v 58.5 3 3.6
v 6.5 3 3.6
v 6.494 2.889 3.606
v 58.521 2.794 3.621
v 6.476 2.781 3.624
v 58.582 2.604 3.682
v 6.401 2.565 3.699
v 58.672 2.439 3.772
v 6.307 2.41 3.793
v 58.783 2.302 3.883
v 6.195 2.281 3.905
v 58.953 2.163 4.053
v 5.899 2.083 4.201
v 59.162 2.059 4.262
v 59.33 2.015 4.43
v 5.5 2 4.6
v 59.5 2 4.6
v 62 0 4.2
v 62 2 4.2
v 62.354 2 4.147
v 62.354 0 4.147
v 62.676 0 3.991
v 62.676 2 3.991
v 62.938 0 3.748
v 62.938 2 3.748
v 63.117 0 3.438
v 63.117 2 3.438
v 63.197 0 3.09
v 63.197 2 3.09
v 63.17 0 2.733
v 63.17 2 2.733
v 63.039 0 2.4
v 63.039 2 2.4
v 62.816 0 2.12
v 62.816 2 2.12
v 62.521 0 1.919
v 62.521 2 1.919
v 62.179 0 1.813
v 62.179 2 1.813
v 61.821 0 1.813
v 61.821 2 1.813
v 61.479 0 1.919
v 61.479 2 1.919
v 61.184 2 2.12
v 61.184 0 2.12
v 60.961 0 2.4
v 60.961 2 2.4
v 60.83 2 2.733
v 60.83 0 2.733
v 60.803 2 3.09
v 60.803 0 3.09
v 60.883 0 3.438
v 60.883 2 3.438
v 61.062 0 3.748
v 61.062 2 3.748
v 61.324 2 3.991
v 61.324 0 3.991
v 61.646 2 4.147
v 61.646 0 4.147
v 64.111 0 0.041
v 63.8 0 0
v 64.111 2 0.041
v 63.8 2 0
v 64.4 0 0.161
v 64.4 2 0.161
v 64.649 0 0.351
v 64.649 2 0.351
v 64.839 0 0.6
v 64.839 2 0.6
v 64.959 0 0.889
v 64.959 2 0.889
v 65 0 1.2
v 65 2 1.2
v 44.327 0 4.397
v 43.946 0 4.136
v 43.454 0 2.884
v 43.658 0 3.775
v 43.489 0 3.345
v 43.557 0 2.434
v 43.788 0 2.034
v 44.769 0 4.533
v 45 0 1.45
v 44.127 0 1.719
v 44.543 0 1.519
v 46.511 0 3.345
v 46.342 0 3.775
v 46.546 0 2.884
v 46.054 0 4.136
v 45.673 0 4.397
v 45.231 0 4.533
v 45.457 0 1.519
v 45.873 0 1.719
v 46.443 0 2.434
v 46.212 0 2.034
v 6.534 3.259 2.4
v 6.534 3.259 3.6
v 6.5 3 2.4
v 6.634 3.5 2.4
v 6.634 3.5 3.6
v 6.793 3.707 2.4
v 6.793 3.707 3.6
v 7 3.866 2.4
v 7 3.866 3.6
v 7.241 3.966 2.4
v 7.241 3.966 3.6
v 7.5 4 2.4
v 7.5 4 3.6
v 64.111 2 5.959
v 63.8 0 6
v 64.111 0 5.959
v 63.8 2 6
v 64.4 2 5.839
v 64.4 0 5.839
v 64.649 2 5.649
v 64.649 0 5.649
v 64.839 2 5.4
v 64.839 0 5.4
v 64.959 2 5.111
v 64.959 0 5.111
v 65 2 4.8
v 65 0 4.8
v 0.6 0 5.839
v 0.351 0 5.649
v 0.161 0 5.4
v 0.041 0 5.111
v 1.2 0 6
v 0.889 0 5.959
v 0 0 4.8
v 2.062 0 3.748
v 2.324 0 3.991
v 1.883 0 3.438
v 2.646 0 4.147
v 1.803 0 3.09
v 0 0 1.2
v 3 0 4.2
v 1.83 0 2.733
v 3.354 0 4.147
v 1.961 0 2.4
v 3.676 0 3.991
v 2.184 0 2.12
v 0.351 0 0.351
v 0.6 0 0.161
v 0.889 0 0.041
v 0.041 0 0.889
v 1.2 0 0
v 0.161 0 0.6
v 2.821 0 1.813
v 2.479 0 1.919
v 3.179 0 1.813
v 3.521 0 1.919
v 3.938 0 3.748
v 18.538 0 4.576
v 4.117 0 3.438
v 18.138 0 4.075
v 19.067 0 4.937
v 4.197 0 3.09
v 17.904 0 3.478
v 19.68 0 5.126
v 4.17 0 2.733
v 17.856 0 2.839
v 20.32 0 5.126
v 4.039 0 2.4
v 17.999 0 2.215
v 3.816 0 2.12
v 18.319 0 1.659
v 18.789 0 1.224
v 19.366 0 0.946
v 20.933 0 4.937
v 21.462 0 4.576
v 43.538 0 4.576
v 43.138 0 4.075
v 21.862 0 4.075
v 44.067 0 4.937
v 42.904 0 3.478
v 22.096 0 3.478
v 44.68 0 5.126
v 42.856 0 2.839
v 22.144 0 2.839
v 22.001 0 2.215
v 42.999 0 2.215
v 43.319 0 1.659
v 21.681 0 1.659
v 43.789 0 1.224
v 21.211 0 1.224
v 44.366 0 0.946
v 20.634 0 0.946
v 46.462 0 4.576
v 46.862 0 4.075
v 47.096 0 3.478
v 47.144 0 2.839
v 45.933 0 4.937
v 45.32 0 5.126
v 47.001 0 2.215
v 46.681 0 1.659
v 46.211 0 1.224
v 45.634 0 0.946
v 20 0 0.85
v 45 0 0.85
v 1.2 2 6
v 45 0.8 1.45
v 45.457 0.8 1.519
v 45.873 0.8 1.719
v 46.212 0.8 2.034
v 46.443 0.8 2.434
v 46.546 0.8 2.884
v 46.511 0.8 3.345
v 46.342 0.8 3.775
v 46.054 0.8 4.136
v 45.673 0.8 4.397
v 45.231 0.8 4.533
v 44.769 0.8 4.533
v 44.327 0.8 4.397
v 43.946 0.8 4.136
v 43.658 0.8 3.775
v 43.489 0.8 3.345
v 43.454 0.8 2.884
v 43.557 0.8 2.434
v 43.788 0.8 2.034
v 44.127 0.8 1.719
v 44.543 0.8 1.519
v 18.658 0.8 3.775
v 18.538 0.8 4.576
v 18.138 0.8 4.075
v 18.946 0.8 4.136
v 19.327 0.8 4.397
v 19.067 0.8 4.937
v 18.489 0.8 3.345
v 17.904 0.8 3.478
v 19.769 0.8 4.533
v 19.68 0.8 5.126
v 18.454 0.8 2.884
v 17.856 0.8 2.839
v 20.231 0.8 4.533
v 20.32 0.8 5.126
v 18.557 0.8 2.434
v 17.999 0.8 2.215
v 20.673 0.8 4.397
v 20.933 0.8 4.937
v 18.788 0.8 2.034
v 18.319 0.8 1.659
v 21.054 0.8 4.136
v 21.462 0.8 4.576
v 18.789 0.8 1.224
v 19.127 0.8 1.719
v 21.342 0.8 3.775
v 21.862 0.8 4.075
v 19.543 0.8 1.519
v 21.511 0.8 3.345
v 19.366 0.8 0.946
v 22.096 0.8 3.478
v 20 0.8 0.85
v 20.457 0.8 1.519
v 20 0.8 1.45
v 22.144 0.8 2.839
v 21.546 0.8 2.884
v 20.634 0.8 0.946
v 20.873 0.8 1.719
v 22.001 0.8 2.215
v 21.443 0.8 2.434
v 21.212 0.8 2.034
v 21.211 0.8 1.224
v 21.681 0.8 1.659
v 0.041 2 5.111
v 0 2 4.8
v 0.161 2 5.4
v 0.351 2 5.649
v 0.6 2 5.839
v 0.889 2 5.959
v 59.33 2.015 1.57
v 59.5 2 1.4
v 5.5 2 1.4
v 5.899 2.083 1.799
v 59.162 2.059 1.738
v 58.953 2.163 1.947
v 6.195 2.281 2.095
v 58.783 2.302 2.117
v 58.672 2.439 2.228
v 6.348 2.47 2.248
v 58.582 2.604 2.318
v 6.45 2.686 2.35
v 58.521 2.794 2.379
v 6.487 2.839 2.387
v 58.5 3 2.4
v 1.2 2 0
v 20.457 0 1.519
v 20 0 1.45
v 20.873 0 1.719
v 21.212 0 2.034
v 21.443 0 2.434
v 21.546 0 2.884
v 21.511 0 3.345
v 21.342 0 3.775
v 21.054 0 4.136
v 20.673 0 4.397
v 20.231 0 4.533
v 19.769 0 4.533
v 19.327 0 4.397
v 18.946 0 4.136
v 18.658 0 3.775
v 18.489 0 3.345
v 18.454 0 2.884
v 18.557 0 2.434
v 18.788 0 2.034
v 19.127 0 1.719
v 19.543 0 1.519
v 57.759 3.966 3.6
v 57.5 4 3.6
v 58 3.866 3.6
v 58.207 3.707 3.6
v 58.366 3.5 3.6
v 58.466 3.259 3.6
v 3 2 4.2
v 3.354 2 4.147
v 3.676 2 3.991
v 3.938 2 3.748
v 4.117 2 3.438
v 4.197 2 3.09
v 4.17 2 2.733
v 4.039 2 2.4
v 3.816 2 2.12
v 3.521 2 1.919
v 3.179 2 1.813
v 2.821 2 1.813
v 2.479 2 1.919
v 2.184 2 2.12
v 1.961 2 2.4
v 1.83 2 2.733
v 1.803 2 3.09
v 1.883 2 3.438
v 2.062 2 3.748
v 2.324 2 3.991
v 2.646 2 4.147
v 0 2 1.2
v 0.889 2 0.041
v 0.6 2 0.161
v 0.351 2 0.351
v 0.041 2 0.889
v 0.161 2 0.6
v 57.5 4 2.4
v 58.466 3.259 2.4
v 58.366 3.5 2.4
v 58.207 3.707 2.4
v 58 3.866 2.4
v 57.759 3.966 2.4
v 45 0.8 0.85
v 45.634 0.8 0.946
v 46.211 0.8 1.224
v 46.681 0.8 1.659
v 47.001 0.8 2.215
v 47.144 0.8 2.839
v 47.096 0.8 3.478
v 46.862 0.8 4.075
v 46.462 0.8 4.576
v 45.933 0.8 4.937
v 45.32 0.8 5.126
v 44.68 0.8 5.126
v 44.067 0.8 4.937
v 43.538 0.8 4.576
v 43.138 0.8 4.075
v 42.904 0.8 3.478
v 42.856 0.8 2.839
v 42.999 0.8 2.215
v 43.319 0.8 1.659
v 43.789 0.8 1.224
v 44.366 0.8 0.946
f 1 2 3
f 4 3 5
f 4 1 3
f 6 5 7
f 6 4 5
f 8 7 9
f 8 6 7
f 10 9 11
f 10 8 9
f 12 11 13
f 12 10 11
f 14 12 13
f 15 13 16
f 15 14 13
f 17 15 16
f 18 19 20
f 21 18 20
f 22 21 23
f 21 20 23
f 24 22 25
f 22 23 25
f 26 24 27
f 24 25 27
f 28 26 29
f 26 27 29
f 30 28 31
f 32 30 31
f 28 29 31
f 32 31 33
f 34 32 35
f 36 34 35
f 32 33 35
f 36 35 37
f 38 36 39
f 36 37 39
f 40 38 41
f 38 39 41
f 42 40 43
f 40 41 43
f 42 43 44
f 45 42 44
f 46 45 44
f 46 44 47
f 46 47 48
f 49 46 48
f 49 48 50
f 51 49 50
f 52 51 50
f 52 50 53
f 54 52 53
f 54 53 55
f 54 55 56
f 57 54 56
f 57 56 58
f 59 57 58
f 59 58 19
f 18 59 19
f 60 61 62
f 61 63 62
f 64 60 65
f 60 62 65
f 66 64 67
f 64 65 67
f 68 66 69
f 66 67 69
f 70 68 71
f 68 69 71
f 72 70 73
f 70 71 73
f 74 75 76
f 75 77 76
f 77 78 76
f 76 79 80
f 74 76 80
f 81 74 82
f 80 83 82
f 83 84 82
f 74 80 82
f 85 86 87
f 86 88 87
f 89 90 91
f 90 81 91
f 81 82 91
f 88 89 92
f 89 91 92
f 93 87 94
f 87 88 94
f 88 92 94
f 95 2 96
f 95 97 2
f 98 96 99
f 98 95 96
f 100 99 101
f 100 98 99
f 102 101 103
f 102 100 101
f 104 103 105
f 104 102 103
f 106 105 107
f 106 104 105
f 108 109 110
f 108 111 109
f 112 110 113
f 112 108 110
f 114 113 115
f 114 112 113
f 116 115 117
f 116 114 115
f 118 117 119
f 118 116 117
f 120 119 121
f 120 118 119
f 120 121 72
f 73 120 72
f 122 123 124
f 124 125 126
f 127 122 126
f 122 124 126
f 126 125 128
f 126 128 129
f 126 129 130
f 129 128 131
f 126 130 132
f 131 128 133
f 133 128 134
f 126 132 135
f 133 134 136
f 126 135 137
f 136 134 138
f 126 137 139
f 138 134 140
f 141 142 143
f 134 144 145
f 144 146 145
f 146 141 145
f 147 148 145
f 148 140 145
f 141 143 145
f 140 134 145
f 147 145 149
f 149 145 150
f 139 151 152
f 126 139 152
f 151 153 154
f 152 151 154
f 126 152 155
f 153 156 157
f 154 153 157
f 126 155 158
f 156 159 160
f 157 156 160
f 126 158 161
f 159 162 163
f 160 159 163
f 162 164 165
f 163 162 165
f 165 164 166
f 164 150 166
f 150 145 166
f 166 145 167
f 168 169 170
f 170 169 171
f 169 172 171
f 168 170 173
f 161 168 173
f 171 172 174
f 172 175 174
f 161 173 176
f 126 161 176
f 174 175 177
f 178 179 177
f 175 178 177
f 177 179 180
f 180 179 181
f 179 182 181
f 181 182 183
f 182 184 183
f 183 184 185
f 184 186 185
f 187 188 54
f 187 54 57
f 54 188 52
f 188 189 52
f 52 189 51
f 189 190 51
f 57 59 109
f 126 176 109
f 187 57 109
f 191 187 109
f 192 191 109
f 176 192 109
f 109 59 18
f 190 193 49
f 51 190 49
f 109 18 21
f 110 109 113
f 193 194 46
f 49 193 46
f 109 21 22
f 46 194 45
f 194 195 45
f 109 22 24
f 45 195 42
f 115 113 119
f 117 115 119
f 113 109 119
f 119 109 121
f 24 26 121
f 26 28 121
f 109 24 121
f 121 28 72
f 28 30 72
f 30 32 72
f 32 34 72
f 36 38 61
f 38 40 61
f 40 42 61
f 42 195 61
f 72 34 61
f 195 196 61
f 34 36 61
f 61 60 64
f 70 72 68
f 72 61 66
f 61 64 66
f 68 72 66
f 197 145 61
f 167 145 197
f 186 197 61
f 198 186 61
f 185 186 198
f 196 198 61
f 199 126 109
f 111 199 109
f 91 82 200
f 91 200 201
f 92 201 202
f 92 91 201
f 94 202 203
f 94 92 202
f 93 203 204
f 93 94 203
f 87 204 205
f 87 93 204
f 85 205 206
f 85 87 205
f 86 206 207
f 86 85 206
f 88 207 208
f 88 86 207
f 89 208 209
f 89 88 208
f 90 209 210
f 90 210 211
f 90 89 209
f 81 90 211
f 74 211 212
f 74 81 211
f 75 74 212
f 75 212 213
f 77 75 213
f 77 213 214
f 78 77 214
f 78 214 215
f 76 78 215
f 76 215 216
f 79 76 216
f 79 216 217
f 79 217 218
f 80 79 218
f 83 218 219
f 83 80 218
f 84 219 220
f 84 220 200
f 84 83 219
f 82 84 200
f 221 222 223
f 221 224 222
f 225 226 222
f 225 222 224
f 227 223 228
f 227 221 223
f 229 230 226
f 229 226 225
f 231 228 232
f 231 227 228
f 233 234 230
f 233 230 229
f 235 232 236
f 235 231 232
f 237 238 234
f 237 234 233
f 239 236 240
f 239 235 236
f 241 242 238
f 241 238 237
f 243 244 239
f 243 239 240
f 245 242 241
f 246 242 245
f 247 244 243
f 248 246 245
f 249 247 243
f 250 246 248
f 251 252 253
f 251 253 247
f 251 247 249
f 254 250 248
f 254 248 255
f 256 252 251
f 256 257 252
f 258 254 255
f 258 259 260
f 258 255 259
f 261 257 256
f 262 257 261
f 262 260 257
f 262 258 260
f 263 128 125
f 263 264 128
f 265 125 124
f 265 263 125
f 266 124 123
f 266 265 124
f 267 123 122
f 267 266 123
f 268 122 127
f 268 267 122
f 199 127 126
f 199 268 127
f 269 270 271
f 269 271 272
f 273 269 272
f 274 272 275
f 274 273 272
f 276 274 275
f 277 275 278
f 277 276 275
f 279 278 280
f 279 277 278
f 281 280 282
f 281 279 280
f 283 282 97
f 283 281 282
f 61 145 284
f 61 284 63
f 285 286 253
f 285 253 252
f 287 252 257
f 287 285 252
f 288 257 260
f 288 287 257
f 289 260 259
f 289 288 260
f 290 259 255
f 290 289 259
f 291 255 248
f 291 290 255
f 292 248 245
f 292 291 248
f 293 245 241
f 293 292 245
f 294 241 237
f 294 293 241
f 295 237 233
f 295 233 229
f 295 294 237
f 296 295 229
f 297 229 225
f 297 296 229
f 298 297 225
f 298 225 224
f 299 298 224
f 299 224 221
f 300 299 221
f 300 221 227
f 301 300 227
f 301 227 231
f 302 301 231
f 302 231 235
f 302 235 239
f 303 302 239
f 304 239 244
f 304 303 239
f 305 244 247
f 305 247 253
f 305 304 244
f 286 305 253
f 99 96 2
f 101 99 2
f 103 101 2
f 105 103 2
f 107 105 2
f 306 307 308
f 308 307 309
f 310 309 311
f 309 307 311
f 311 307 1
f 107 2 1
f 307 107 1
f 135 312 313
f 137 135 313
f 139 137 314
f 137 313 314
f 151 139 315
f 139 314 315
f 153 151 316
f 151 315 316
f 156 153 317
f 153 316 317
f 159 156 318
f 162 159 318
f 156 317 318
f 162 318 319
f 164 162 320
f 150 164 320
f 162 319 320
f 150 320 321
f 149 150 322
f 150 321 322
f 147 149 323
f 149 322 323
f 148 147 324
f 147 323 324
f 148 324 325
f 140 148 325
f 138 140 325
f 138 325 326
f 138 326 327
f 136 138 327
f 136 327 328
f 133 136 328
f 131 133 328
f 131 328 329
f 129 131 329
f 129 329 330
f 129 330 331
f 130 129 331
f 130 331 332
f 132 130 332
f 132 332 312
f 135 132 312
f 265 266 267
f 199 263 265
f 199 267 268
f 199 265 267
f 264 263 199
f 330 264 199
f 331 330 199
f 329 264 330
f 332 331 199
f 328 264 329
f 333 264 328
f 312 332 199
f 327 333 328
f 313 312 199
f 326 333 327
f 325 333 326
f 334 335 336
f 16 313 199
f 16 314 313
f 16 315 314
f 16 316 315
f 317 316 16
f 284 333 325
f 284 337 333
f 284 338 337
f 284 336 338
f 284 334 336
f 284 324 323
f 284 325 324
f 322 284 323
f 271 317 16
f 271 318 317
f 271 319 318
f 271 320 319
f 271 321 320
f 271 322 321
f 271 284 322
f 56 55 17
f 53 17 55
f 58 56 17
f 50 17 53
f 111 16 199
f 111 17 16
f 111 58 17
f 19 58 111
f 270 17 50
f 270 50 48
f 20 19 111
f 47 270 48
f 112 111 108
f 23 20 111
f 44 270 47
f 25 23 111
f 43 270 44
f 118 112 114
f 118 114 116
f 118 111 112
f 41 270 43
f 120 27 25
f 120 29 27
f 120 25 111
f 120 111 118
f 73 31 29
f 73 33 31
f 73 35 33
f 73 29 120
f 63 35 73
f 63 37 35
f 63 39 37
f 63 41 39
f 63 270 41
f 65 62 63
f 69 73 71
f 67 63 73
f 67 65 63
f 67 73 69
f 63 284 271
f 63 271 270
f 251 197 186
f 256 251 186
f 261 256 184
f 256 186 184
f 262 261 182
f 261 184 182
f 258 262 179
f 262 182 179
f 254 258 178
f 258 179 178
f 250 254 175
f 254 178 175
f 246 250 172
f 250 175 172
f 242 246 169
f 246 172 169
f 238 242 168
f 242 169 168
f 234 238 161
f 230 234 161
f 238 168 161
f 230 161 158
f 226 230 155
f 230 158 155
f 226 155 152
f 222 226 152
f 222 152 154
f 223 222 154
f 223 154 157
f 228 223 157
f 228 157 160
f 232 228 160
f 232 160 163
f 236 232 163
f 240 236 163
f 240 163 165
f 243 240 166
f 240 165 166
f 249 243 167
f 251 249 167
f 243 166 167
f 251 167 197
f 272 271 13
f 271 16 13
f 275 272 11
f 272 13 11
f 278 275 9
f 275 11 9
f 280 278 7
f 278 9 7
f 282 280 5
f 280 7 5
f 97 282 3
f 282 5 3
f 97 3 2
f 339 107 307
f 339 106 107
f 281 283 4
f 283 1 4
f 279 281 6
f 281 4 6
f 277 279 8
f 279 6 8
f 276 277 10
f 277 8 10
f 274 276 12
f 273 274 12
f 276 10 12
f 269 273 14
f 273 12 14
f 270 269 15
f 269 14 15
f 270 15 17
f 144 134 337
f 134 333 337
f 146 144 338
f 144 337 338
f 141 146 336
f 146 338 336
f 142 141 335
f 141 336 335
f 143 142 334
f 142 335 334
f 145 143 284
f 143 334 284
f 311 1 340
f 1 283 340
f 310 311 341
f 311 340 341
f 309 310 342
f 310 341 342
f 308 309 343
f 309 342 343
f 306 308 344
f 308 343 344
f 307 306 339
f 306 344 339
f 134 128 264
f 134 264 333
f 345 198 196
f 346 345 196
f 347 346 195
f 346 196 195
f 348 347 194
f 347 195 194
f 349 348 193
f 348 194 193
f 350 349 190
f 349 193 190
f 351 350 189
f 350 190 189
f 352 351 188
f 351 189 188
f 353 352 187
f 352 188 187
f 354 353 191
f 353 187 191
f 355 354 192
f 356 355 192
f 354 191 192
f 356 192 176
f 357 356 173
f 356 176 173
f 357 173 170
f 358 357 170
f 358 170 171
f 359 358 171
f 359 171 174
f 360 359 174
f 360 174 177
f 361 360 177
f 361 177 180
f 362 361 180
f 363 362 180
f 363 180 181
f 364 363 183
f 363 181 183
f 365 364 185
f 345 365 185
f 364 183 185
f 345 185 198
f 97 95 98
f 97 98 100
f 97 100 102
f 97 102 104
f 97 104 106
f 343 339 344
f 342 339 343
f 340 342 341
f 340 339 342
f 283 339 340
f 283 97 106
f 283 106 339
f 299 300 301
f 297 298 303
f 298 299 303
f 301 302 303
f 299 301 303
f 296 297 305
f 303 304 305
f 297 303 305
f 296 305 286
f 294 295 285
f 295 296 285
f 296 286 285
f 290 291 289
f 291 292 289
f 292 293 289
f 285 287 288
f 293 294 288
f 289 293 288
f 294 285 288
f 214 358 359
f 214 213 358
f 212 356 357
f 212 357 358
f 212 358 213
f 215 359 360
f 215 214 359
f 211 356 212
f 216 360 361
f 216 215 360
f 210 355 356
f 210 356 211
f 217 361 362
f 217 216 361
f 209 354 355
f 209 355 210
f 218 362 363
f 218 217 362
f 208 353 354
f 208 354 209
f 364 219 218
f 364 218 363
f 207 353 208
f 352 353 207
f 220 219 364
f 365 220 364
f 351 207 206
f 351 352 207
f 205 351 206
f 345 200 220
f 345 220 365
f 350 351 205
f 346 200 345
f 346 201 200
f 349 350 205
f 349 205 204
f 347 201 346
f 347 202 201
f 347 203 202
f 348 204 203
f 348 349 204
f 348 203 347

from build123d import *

# Parameters (mm, degrees)
SKETCH1_W           = 65
SKETCH1_H           = 6
BOSS_EXTRUDE1_DEPTH = 2
SKETCH2_R           = 1.2
CUT_EXTRUDE1_DEPTH  = 66.306967469
SKETCH3_W           = 52
SKETCH3_H           = 1.2
BOSS_EXTRUDE2_DEPTH = 2
FILLET1_R           = 1.2
FILLET3_R           = 1
FILLET4_R           = 1
FILLET5_R           = 1
SKETCH4_R           = 2.15
SKETCH4_R_2         = 1.55
CUT_EXTRUDE2_DEPTH  = 0.8


with BuildPart() as part:
    # Sketch1 → Boss-Extrude1 (new body)
    with BuildSketch(Plane(origin=(0, 0, 0), x_dir=(1, 0, 0), z_dir=(0, 1, 0))):
        with Locations((32.5, -3)):
            Rectangle(SKETCH1_W, SKETCH1_H)
    extrude(amount=BOSS_EXTRUDE1_DEPTH)

    # Sketch2 → Cut-Extrude1 (cut, through all)
    with BuildSketch(Plane(origin=(0, 2, 0), x_dir=(1, 0, 0), z_dir=(0, 1, 0))):
        with Locations(Location((62, -3, 0), (0, 0, 270))):
            Circle(SKETCH2_R)
        with Locations(Location((3, -3, 0), (0, 0, 270))):
            Circle(SKETCH2_R)
    extrude(amount=-CUT_EXTRUDE1_DEPTH, mode=Mode.SUBTRACT)

    # Sketch3 → Boss-Extrude2 (add)
    with BuildSketch(Plane(origin=(0, 2, 0), x_dir=(1, 0, 0), z_dir=(0, 1, 0))):
        with Locations((32.5, -3)):
            Rectangle(SKETCH3_W, SKETCH3_H)
    extrude(amount=BOSS_EXTRUDE2_DEPTH)

    # Fillet1
    fillet1_edges = [part.edges().sort_by_distance(p)[0] for p in [
        (0, 1, 0),
        (65, 1, 0),
        (65, 1, 6),
        (0, 1, 6),
    ]]
    fillet(fillet1_edges, radius=FILLET1_R)

    # Fillet3
    fillet3_edges = [part.edges().sort_by_distance(p)[0] for p in [
        (6.5, 4, 3),
        (58.5, 4, 3),
    ]]
    fillet(fillet3_edges, radius=FILLET3_R)

    # Fillet4
    fillet4_edges = [part.edges().sort_by_distance(p)[0] for p in [
        (32.5, 2, 3.6),
        (32.5, 2, 2.4),
    ]]
    fillet(fillet4_edges, radius=FILLET4_R)

    # Fillet5
    fillet5_edges = [part.edges().sort_by_distance(p)[0] for p in [
        (58.5, 2, 3),
        (6.5, 2, 3),
    ]]
    fillet(fillet5_edges, radius=FILLET5_R - 0.0001)  # a hair under: the kernel refuses the full size

    # Sketch4 → Cut-Extrude2 (cut)
    # profile 1 of 2: a face of its own
    with BuildSketch(Plane(origin=(0, 0, 0), x_dir=(-1, 0, 0), z_dir=(0, -1, 0))):
        with Locations(Location((-20, -3, 0), (0, 0, 90))):
            Circle(SKETCH4_R)
        with Locations(Location((-20, -3, 0), (0, 0, 90))):
            Circle(SKETCH4_R_2, mode=Mode.SUBTRACT)
    # profile 2 of 2: a face of its own
    with BuildSketch(Plane(origin=(0, 0, 0), x_dir=(-1, 0, 0), z_dir=(0, -1, 0))):
        with Locations(Location((-45, -3, 0), (0, 0, 90))):
            Circle(SKETCH4_R)
        with Locations(Location((-45, -3, 0), (0, 0, 90))):
            Circle(SKETCH4_R_2, mode=Mode.SUBTRACT)
    extrude(amount=-CUT_EXTRUDE2_DEPTH, mode=Mode.SUBTRACT)


solid = part.part
